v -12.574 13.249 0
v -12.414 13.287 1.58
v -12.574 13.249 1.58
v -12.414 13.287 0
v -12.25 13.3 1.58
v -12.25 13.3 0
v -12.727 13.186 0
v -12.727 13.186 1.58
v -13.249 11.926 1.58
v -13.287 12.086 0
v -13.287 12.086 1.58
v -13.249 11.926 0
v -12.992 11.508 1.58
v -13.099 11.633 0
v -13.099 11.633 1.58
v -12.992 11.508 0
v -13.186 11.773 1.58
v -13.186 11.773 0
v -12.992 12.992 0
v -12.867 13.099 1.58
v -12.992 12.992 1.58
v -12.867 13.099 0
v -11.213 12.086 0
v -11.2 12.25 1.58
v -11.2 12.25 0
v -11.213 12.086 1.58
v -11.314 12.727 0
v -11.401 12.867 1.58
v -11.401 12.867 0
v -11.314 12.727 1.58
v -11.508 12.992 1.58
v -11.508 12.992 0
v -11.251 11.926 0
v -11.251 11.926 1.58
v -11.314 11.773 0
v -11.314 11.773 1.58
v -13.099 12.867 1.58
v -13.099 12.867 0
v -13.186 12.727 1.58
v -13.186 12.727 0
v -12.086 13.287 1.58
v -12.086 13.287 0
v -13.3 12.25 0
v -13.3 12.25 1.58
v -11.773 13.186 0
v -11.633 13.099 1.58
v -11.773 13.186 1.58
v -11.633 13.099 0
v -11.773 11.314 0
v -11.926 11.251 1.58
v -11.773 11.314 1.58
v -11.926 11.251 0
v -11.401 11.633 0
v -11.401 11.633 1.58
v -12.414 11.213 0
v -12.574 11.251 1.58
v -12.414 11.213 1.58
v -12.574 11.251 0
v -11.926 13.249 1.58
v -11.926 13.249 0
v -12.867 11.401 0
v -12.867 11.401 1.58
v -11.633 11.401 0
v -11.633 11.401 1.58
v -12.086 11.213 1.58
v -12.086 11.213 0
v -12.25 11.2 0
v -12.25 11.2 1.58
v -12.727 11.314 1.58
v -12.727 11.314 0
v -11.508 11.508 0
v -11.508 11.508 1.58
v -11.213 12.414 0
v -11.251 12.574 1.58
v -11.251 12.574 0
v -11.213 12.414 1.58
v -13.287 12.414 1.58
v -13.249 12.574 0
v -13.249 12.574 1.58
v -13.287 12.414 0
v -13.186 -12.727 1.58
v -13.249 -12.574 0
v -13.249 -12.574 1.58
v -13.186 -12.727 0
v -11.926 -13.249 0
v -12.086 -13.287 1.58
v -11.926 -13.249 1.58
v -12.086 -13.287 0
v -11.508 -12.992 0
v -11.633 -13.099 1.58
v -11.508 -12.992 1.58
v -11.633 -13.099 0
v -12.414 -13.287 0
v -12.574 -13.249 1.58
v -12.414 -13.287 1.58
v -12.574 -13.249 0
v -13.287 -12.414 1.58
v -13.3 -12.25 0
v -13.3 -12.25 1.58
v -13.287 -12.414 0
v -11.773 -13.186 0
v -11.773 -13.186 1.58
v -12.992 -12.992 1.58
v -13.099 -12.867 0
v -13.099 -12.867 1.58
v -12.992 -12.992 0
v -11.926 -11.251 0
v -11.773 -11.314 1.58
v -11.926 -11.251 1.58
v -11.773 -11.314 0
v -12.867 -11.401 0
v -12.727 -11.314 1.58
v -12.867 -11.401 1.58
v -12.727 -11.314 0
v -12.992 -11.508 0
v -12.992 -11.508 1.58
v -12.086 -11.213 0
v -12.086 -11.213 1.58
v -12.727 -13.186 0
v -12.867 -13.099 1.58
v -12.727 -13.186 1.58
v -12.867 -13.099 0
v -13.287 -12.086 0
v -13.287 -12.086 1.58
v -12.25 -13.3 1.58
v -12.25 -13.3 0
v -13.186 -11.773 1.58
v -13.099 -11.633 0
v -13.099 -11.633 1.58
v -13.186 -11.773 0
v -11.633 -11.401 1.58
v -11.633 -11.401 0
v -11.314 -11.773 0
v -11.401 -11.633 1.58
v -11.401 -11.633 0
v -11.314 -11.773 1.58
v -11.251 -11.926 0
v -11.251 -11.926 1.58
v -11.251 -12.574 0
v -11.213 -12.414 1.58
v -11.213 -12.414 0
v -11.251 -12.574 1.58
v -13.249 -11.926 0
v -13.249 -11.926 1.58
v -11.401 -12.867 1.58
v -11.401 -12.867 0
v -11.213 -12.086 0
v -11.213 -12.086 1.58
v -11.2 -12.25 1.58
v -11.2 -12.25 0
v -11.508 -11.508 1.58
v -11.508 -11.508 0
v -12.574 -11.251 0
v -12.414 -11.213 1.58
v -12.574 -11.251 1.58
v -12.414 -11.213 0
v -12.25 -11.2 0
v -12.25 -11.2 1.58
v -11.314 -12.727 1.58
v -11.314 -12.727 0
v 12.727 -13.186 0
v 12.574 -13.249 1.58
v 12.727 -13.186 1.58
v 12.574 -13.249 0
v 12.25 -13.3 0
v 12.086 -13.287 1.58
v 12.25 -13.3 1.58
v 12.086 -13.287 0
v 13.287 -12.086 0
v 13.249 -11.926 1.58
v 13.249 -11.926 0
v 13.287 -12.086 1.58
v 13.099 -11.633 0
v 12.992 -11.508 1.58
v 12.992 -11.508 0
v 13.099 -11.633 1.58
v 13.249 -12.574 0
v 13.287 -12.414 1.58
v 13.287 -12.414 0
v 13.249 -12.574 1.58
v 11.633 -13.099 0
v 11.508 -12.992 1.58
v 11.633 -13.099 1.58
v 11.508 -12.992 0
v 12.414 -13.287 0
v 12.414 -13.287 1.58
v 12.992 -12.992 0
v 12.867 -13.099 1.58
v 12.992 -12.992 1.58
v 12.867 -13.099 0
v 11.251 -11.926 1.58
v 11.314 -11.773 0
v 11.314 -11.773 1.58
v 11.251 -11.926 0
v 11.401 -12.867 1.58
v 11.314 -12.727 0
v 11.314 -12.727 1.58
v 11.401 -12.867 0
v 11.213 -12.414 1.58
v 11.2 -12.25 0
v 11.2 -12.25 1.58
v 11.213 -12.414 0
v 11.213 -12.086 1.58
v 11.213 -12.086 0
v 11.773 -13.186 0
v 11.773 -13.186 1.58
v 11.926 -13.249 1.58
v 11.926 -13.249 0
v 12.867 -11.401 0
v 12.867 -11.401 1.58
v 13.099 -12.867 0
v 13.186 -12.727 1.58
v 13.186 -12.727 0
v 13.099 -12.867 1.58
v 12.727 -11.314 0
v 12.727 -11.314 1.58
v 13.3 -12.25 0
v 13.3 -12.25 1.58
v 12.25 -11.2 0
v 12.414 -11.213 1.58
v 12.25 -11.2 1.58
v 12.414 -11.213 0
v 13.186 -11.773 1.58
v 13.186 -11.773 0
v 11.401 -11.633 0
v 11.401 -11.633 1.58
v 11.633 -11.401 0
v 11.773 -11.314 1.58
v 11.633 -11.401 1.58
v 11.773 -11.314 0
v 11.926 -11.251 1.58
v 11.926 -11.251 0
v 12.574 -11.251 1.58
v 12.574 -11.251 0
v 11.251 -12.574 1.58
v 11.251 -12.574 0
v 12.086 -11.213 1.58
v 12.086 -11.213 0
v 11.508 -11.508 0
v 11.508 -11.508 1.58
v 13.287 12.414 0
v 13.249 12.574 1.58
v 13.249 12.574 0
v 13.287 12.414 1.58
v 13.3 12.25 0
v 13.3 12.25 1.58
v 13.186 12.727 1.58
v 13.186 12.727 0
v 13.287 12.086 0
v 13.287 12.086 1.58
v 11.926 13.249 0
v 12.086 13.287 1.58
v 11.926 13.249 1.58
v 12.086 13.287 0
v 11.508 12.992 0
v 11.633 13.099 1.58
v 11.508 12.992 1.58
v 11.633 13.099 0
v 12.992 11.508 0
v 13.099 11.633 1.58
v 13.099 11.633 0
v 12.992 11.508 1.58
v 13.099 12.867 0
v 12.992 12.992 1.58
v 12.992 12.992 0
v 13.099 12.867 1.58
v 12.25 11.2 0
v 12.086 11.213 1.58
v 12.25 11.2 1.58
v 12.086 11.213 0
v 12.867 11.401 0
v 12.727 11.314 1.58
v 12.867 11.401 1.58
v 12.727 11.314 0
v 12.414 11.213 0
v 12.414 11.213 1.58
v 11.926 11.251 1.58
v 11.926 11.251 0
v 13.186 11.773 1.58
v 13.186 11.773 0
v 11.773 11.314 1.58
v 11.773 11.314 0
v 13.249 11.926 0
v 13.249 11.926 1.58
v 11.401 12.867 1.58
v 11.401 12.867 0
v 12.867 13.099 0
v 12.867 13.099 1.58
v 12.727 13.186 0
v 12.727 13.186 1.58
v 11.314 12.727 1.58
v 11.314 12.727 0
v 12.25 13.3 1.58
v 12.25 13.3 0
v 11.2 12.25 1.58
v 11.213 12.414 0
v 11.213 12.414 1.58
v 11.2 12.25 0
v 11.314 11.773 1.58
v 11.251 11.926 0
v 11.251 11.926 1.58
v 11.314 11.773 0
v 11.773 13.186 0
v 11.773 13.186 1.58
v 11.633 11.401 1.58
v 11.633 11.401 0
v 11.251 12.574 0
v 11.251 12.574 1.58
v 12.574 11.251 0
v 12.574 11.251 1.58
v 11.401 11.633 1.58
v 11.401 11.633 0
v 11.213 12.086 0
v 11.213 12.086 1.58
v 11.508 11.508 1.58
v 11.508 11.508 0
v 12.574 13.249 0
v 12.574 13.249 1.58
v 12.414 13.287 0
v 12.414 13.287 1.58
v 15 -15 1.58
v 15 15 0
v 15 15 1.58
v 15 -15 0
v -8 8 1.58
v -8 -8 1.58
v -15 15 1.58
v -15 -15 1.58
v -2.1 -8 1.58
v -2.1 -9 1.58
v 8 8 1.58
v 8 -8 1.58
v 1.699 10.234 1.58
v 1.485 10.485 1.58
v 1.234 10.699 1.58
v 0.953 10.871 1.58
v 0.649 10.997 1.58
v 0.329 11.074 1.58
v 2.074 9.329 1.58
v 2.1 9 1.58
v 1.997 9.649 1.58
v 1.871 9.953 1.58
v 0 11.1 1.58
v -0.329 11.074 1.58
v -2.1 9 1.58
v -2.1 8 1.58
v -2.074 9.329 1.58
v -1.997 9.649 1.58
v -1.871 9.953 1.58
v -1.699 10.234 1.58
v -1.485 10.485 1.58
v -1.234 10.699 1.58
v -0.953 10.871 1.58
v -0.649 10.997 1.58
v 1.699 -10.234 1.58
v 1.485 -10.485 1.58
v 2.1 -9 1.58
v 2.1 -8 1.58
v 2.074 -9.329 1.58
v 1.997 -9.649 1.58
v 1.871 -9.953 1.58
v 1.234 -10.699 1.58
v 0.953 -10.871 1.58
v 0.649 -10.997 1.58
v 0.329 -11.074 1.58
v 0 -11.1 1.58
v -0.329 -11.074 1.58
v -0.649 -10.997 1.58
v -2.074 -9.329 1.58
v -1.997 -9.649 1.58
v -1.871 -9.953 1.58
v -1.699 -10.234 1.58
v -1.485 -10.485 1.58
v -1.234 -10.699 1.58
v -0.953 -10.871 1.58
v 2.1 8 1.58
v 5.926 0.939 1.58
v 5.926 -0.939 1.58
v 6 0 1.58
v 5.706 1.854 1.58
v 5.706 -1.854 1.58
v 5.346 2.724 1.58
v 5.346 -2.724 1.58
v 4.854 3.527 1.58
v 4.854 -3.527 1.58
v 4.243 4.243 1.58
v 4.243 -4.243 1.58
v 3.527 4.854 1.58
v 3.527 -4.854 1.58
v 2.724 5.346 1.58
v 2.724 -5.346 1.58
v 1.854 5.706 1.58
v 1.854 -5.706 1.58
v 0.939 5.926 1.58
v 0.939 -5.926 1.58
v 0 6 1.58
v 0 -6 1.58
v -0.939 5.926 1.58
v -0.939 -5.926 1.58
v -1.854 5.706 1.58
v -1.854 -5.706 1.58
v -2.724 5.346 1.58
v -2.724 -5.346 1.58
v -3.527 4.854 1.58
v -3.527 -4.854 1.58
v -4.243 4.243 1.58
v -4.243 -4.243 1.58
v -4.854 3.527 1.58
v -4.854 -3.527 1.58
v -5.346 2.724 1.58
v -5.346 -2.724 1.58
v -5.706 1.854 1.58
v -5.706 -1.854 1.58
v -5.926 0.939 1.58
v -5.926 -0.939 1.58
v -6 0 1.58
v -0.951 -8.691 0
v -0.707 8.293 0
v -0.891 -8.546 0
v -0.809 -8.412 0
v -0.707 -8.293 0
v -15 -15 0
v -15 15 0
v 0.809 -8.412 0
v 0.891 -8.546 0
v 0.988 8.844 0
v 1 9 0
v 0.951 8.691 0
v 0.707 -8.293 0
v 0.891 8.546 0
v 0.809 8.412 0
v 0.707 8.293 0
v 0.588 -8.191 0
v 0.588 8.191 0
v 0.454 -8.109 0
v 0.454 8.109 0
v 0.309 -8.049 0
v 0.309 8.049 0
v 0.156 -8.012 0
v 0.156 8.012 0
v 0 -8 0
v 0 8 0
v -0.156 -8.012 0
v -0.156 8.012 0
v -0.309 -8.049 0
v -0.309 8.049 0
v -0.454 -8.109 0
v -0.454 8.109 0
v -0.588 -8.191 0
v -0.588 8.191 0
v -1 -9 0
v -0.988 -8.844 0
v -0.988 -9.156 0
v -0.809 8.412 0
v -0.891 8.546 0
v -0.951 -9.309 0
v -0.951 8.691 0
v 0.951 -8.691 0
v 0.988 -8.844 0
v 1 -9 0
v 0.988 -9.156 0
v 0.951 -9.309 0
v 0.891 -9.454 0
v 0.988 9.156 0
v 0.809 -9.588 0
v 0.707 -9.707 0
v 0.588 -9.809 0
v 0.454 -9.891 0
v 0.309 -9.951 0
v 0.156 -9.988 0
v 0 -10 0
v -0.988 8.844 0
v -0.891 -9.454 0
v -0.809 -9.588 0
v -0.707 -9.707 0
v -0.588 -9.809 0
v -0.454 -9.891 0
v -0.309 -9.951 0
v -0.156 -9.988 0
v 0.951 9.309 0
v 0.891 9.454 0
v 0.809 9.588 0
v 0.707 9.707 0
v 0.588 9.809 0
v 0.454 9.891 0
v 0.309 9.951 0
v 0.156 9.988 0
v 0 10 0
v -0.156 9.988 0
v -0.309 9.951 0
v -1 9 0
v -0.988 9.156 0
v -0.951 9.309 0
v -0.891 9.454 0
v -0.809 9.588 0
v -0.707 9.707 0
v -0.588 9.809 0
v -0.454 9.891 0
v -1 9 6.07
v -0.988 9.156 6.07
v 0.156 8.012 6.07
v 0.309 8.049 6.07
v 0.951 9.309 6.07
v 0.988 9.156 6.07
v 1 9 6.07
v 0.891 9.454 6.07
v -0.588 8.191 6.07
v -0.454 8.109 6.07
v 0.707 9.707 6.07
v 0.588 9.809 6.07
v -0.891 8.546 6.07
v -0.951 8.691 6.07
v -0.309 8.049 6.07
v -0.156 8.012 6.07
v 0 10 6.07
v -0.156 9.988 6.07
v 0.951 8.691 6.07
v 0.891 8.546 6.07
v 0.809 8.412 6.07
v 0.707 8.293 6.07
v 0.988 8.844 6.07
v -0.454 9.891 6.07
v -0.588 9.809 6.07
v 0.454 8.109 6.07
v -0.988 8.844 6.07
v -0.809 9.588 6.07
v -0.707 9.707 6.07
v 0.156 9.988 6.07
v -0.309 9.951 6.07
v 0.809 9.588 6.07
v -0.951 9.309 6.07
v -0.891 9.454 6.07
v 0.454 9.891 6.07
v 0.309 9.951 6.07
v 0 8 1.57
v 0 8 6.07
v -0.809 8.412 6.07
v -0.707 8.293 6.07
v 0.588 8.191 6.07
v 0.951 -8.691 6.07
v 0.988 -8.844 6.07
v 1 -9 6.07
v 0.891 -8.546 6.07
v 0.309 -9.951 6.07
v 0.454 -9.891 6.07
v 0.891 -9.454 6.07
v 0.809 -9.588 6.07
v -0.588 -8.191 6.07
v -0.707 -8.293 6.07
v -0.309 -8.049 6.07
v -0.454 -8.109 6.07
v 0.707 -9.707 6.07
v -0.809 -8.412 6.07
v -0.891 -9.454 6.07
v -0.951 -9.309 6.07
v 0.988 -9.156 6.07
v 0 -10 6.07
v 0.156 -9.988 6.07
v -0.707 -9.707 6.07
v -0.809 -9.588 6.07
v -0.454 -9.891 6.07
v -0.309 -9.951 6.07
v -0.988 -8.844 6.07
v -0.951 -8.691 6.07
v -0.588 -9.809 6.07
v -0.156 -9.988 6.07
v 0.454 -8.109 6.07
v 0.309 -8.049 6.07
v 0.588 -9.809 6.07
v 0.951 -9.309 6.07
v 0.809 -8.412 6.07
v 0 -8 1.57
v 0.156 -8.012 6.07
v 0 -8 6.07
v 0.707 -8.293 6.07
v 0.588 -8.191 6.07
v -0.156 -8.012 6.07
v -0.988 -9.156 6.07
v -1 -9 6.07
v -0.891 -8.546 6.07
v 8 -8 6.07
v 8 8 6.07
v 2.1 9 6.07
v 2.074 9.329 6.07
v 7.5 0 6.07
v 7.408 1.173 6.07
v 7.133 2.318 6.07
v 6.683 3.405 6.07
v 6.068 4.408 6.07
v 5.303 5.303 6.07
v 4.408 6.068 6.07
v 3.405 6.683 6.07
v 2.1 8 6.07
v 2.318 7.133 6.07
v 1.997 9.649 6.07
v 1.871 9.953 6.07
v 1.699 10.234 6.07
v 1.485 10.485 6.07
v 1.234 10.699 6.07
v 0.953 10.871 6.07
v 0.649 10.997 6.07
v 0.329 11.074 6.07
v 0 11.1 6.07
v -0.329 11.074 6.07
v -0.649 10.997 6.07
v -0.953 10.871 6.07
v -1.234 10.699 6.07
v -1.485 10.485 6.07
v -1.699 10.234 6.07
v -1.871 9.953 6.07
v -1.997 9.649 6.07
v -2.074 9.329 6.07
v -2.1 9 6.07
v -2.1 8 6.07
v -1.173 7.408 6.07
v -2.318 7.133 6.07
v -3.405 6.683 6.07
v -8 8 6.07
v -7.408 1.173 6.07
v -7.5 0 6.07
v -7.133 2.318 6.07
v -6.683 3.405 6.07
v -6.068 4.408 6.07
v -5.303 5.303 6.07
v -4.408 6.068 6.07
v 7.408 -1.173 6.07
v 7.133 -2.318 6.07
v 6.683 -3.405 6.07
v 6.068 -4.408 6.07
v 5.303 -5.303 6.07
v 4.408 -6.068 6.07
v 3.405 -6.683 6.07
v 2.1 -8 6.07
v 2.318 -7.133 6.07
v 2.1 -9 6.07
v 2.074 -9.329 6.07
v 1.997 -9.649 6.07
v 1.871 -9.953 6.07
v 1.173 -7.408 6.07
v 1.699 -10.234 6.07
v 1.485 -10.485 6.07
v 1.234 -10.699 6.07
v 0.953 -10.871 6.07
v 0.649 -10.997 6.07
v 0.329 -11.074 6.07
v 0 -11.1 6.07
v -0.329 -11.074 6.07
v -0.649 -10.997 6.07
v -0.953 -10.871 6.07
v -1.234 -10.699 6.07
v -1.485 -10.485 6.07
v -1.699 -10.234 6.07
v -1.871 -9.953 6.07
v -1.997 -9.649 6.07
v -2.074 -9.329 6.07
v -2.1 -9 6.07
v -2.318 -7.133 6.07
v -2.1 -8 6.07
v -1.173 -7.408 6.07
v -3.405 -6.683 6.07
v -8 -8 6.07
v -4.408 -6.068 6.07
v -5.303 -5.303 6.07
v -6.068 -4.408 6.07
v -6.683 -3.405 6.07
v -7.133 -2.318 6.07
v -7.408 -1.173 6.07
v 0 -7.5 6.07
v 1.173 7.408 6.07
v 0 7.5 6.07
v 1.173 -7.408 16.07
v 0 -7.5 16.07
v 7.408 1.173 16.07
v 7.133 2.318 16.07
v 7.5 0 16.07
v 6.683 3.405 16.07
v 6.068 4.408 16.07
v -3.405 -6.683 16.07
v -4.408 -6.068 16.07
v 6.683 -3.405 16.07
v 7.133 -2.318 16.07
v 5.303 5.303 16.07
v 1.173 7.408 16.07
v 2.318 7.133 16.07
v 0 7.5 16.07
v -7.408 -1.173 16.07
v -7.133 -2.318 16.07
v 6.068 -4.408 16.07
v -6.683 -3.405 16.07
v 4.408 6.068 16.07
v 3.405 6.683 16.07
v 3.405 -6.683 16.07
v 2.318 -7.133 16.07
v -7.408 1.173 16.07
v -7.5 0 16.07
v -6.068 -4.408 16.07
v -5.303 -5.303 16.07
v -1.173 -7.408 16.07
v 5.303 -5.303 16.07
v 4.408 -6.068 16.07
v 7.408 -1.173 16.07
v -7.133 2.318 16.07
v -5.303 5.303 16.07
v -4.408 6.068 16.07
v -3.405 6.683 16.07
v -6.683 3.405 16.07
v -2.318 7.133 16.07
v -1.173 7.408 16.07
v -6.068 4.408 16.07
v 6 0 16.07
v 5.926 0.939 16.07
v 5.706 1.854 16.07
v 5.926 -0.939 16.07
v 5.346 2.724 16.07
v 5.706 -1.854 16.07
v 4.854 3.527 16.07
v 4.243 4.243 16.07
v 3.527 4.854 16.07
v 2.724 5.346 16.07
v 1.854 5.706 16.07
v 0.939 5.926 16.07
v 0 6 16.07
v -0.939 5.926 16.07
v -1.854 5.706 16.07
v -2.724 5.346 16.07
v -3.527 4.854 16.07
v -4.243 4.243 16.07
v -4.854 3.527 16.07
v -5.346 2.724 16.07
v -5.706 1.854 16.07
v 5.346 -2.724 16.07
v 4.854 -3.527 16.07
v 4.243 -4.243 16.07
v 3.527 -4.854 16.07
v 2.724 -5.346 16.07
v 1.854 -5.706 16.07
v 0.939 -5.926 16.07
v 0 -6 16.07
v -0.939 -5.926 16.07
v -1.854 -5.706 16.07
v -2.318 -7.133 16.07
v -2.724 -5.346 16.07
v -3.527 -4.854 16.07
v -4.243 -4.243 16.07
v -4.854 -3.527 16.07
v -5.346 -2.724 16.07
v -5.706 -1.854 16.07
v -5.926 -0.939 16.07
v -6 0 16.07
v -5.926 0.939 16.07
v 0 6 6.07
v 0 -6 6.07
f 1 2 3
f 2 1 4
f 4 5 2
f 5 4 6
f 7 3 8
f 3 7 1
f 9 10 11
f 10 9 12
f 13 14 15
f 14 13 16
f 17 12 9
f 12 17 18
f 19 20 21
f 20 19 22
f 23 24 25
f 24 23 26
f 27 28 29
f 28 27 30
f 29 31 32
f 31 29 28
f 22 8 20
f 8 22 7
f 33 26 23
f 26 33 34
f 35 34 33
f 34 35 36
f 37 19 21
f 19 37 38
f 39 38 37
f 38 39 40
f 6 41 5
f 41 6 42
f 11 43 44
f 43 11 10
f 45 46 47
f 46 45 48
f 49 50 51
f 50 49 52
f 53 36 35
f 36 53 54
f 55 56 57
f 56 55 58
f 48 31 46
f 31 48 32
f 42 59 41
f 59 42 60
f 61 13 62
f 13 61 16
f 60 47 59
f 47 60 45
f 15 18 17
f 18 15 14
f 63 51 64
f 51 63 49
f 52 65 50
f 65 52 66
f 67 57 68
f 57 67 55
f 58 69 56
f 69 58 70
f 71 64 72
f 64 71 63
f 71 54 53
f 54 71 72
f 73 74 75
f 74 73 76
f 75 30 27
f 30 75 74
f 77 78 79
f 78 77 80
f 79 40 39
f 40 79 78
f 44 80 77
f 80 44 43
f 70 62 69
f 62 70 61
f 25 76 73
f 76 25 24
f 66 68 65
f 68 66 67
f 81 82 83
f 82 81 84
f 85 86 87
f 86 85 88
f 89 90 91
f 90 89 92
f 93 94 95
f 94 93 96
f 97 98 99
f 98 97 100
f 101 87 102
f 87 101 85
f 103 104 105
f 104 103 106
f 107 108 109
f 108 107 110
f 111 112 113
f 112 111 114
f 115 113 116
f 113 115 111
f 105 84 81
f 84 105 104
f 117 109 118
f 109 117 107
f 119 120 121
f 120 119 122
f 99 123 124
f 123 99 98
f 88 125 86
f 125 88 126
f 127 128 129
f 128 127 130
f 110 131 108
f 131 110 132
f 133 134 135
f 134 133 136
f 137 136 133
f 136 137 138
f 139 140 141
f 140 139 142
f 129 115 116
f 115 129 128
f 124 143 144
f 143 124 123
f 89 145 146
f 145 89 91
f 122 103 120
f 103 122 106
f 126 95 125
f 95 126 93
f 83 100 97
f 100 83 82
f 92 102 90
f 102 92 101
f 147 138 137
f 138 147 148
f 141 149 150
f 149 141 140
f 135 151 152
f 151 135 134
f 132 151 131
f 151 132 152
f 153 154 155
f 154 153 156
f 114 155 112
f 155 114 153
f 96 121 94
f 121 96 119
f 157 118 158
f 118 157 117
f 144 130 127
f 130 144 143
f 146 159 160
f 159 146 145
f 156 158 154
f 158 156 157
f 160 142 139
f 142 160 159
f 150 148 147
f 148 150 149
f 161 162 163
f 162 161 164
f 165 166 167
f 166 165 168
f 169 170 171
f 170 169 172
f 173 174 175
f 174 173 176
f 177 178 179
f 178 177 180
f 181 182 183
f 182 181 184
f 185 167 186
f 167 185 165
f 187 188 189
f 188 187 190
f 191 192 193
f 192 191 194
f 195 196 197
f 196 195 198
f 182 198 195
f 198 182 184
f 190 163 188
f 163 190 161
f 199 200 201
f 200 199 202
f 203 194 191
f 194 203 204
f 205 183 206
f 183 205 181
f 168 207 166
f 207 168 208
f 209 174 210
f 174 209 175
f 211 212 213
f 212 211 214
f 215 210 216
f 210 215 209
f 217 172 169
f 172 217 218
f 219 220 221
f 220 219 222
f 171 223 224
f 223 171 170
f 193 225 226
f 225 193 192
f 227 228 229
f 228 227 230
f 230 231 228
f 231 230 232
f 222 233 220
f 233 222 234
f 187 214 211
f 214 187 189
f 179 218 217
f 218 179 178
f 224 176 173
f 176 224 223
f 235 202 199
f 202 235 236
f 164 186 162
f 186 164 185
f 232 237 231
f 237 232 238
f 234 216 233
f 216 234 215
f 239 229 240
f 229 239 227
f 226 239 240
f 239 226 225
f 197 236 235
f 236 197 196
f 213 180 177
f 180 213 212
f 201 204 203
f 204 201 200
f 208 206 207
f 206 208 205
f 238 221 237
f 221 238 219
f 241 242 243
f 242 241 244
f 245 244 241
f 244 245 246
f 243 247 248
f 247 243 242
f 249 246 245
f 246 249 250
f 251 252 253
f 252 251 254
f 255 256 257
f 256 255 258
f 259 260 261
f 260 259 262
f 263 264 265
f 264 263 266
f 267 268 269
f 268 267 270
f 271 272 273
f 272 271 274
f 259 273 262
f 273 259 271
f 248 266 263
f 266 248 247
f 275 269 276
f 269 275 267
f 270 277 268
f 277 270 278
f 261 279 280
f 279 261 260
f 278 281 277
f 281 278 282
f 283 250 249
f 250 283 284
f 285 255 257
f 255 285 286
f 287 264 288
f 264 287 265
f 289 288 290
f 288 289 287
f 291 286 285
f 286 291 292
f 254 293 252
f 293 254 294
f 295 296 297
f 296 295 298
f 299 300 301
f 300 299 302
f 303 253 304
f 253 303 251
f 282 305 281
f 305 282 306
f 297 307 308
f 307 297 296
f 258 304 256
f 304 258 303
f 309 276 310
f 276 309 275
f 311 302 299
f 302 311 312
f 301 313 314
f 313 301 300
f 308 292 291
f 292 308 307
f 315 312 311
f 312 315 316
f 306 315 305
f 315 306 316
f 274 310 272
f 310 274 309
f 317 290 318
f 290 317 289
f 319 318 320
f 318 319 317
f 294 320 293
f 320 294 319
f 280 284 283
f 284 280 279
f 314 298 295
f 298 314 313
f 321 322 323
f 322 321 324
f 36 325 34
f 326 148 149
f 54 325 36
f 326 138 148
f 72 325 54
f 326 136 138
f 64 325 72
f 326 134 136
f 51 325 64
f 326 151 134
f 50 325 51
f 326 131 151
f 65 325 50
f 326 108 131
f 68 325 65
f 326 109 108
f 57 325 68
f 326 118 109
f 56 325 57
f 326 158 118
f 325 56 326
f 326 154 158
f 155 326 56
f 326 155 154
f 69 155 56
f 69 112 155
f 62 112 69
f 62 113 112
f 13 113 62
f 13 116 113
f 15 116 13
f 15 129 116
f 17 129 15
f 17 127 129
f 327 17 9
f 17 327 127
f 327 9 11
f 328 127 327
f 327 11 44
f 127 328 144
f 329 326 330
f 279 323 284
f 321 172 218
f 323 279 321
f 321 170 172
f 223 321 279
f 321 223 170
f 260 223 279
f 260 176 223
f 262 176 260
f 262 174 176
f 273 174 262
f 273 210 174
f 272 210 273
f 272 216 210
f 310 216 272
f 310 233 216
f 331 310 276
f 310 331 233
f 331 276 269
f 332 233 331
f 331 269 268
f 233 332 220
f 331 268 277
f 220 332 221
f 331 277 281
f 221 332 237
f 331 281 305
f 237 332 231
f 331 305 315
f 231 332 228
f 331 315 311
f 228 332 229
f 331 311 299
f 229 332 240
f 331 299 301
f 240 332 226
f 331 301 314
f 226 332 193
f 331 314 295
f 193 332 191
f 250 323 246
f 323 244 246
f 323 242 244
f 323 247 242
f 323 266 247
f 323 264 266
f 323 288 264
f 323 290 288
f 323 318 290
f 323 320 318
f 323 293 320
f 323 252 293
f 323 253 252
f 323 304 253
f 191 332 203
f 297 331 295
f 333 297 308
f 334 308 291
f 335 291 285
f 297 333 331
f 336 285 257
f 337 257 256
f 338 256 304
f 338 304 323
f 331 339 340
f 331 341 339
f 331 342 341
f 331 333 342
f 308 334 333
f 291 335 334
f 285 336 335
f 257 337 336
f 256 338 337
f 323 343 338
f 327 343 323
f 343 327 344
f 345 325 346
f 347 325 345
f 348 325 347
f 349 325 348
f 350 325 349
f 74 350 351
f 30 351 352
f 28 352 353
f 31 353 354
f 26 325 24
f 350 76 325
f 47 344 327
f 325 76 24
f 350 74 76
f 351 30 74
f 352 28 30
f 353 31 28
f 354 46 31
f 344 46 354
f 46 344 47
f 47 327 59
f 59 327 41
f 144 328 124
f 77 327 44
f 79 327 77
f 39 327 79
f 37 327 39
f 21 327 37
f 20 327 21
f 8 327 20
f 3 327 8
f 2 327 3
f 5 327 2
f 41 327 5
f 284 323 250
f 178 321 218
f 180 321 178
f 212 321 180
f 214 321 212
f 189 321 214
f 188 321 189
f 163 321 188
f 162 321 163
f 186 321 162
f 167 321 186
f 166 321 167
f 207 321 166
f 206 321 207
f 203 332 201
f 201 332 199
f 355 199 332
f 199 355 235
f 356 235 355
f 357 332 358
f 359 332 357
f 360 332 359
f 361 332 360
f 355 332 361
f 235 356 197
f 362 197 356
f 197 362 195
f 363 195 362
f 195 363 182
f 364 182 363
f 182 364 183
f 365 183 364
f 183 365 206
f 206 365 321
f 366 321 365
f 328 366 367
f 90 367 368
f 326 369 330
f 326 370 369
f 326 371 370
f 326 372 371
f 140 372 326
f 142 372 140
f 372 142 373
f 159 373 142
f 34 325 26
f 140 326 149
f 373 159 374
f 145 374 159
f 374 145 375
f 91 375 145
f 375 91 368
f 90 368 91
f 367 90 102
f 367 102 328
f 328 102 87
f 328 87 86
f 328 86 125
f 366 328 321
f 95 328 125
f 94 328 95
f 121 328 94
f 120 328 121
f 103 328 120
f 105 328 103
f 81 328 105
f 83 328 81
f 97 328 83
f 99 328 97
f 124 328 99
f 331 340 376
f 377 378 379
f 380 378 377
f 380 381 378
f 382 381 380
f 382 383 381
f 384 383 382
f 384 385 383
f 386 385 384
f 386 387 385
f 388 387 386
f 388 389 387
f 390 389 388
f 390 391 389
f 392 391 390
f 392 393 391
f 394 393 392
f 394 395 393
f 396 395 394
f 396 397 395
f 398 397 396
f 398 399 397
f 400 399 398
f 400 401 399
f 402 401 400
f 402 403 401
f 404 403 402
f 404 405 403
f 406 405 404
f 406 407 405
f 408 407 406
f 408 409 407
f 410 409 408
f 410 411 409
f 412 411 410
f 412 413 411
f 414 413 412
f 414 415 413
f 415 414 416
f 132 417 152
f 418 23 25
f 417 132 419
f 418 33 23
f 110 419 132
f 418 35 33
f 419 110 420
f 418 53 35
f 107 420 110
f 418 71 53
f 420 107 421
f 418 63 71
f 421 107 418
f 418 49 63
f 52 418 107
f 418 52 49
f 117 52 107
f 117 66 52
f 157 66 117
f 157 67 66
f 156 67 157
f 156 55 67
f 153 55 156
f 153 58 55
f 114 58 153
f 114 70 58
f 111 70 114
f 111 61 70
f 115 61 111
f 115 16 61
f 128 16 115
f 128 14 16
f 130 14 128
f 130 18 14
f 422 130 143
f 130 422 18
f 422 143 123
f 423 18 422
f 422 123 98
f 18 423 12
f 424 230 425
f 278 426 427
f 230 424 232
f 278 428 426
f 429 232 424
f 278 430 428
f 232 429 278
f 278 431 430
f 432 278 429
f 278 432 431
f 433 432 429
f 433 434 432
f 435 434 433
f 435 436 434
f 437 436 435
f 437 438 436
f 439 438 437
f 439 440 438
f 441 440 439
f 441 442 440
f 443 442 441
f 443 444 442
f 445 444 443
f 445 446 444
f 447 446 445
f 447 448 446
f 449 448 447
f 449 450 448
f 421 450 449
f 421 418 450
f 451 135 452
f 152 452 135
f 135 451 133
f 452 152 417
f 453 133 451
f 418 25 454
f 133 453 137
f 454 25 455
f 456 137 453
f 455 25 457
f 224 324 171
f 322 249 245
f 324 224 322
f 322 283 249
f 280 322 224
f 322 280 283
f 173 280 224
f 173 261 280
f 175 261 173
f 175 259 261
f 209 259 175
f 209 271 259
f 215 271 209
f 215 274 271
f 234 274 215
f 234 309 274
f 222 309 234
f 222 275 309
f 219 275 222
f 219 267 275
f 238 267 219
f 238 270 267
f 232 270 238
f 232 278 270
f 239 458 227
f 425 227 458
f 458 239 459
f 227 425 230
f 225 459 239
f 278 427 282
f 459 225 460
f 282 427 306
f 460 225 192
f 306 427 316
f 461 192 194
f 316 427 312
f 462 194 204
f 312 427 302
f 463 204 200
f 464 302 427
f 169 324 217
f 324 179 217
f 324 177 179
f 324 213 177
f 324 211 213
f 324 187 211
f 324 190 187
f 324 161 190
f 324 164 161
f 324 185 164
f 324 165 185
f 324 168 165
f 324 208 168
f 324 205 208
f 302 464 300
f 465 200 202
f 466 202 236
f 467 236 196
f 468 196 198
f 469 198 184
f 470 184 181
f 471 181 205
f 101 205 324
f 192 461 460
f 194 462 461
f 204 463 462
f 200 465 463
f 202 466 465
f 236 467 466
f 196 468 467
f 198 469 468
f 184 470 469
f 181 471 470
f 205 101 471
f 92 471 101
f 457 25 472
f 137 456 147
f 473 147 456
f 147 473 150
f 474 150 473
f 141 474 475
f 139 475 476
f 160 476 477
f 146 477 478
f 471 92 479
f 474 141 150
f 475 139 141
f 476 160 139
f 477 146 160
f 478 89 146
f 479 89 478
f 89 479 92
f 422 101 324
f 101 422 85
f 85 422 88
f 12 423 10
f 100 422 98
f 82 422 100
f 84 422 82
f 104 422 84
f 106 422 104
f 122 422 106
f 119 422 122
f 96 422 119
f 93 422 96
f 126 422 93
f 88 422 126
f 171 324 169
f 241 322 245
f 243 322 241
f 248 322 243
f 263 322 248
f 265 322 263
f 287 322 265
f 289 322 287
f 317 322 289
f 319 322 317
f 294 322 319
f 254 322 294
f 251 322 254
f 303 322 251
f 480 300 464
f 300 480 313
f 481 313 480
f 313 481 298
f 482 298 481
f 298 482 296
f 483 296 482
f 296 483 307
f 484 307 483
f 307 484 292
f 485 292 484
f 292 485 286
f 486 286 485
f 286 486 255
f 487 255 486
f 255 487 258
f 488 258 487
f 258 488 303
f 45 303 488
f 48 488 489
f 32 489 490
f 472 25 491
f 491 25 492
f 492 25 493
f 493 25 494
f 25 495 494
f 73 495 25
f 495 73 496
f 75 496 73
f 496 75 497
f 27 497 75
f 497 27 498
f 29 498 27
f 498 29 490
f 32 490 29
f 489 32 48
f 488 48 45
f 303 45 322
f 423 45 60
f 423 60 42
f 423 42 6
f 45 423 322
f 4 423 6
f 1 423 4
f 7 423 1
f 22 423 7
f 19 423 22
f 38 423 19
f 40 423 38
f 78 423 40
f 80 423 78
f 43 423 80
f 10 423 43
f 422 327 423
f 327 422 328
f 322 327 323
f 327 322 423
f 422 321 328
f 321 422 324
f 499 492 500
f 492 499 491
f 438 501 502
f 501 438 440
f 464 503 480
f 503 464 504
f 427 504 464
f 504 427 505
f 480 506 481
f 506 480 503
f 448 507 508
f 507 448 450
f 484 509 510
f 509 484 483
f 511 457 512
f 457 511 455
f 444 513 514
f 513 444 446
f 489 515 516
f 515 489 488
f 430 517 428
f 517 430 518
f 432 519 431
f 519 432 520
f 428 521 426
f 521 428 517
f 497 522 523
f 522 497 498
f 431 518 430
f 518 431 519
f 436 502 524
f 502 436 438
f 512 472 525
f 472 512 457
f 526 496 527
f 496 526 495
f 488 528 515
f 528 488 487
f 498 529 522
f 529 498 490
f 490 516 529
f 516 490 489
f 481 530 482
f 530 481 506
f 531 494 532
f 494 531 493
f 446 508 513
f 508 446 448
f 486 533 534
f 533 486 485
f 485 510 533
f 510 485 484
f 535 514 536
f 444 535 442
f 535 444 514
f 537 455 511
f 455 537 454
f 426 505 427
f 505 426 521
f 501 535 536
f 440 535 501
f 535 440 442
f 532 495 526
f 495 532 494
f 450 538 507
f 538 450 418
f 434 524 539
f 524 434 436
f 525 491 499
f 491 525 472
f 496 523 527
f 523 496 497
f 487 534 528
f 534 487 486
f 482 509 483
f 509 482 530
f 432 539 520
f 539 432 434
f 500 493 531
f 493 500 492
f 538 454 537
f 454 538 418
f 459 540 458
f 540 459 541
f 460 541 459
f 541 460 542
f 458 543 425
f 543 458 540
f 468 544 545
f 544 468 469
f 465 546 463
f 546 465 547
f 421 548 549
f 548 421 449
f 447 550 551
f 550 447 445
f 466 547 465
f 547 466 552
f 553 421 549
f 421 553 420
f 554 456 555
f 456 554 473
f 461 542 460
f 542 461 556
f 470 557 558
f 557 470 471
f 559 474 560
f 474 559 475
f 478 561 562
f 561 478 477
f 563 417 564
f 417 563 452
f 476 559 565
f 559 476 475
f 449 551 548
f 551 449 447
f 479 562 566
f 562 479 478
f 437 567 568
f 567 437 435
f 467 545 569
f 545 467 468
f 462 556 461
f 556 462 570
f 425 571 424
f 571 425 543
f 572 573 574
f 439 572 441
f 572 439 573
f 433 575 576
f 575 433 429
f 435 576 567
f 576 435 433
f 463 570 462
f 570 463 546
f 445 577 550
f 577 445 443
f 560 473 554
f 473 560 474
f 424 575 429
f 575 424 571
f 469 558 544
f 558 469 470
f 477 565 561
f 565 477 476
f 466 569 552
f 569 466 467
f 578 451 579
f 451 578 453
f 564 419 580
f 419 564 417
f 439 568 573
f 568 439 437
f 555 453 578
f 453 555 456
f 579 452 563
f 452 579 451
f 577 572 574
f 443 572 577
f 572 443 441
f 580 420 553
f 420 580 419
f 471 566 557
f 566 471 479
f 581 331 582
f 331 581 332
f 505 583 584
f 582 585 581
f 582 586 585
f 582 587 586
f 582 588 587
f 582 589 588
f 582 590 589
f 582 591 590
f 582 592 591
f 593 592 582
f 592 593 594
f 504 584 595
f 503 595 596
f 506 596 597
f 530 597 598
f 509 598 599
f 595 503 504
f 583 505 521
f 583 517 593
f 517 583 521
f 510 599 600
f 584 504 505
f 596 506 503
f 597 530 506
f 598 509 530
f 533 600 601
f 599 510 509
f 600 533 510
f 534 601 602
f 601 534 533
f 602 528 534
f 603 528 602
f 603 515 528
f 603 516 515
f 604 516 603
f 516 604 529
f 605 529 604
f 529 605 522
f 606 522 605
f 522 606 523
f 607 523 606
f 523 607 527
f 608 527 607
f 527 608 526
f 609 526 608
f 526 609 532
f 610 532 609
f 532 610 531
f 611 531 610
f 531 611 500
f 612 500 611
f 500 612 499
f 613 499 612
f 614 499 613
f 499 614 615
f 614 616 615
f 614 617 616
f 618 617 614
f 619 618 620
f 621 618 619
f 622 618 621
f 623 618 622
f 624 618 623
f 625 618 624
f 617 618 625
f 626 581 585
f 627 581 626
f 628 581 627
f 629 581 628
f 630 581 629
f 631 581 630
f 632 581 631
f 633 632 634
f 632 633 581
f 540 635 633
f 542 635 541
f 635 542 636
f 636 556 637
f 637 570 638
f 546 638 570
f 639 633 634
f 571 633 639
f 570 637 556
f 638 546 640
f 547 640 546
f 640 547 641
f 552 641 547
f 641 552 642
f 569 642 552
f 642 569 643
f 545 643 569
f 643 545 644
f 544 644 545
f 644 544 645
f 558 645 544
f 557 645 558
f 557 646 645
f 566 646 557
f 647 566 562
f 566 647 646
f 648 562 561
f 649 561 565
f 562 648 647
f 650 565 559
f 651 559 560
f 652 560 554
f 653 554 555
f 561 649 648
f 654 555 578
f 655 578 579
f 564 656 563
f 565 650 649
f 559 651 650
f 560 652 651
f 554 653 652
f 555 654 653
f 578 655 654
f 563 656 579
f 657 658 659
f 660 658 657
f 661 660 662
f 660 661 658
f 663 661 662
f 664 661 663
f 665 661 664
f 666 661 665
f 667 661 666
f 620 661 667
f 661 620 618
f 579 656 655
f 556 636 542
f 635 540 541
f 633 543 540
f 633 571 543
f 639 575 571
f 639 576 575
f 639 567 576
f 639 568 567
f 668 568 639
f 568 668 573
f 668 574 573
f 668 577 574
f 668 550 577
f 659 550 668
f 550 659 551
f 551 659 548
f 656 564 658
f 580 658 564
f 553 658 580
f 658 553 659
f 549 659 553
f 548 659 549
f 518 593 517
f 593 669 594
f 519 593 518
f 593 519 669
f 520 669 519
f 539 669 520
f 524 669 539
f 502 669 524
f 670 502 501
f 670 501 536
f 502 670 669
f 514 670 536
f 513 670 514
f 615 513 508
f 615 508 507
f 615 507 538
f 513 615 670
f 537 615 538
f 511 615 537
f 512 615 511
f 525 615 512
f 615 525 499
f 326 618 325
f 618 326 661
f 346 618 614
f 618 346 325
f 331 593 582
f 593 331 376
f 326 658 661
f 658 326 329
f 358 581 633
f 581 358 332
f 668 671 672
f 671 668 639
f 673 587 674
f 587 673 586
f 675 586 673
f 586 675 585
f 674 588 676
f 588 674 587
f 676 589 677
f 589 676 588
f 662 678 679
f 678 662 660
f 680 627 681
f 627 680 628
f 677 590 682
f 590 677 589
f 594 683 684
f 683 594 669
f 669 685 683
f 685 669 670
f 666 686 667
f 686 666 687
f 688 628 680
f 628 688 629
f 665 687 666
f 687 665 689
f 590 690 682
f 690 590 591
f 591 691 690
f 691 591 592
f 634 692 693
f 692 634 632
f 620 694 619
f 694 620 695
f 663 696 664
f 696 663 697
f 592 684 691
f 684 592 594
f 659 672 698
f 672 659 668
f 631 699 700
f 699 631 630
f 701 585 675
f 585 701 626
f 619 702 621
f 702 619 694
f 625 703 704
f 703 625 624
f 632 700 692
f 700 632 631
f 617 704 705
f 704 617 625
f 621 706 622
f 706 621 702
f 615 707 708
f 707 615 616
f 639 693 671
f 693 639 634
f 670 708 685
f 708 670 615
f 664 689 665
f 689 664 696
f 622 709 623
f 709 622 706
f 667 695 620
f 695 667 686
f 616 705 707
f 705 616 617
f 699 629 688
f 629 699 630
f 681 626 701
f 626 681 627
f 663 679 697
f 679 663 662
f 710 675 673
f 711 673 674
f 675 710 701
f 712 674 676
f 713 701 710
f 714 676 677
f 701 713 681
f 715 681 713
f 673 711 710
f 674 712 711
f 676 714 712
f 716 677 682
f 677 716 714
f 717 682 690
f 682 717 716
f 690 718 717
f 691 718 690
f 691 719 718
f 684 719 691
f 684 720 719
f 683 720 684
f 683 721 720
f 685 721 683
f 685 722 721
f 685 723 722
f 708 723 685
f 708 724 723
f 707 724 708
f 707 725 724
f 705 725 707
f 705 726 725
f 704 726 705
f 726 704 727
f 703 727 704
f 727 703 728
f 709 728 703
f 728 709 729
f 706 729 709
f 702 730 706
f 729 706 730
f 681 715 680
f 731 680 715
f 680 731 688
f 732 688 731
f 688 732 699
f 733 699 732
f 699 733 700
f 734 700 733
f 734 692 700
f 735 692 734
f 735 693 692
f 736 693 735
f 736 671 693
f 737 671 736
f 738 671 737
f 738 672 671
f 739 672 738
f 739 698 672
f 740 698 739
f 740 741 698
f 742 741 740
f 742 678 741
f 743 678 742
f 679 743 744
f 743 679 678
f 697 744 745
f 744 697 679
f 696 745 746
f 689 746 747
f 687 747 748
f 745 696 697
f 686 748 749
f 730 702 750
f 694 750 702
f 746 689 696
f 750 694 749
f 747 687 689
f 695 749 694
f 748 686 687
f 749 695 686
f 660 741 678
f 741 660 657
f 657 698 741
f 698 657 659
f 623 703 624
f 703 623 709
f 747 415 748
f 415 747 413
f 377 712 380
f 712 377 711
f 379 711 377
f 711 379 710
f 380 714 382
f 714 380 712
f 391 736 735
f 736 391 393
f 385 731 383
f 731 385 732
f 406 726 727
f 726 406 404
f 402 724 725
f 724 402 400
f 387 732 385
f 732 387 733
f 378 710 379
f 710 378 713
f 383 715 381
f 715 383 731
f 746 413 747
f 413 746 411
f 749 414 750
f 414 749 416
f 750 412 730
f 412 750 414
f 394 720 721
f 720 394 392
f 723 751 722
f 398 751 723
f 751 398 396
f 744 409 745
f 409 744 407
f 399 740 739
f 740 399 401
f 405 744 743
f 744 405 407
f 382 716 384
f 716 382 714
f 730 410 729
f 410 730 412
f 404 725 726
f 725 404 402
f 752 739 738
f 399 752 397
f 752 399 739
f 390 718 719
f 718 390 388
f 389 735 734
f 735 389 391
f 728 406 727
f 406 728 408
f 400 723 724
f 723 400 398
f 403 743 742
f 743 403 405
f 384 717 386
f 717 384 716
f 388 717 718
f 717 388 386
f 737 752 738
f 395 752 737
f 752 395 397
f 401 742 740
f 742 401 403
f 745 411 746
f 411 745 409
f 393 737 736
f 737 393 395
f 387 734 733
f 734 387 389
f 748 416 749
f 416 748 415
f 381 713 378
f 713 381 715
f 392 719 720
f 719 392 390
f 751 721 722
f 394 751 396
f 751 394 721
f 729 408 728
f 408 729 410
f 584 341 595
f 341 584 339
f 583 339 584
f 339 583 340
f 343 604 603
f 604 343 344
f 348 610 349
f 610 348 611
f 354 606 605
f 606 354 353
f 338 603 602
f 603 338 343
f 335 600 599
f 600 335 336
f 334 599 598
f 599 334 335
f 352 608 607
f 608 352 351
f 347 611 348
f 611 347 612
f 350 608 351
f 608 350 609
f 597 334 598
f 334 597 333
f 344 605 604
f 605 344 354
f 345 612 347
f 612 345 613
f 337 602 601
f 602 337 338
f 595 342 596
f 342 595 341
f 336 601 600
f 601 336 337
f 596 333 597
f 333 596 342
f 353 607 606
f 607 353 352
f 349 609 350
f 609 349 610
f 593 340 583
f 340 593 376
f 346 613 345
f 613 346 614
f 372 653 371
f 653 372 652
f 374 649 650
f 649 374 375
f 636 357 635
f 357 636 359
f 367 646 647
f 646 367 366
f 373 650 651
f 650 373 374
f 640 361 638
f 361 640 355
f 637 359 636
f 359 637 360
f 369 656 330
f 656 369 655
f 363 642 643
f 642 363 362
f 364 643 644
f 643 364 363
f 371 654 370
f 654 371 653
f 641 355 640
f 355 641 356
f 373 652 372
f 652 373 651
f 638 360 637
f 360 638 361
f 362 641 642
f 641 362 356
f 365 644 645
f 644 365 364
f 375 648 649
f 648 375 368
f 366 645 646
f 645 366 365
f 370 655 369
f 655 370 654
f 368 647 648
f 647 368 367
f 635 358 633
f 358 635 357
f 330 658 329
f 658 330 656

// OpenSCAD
$fn = 40;

module m12_lens_mount() {
  w = 16;
  base_h = 4.5;
  mount_color = [0.3, 0.3, 0.3];
  flange_w = 18.0;

  difference() {
    union() {
      // Base
      translate([0.0, 0.0, base_h / 2.0])
        color(mount_color)
          cube([w, w, base_h], center=true);

      // Lens thread body
      translate([0.0, 0.0, base_h + 10.0 / 2.0])
        color(mount_color)
          cylinder(h=10, r=7.5, center=true);
    }

    // Lens thread hole
    translate([0.0, 0.0, base_h / 2.0 + 10.0 / 2.0])
      color(mount_color)
        cylinder(h=14.5 + 0.01, r=6, center=true);
  }

  difference() {
    // Lens mount body
    union() {
      translate([0.0, flange_w / 2.0, base_h / 2.0])
        color(mount_color)
          cylinder(h=base_h, r=4.2 / 2.0, center=true);

      translate([0.0, flange_w / 2.0 - 3.0 / 2.0, base_h / 2.0])
        color(mount_color)
          cube([4.2, 3.0, base_h], center=true);
    }

    // Lens mount hole
    translate([0.0, flange_w / 2.0, base_h / 2.0])
      color(mount_color)
        cylinder(h=base_h + 0.01, r=2.0 / 2.0, center=true);
  }

  difference() {
    // Lens mount body
    union() {
      translate([0.0, -flange_w / 2.0, base_h / 2.0])
        color(mount_color)
          cylinder(h=base_h, r=4.2 / 2.0, center=true);

      translate([0.0, -flange_w / 2.0 + 3.0 / 2.0, base_h / 2.0])
        color(mount_color)
          cube([4.2, 3.0, base_h], center=true);
    }

    // Lens mount hole
    translate([0.0, -flange_w / 2.0, base_h / 2.0])
      color(mount_color)
        cylinder(h=base_h + 0.01, r=2.0 / 2.0, center=true);
  }
}

module board_camera() {
  pcb_width = 30.0;
  pcb_thickness = 1.58;
  pcb_hole = 2.1;
  lens_hole = 2.0;

  difference() {
    // PCB body
    translate([0.0, 0.0, pcb_thickness / 2.0])
      color([0.0, 1.0, 0.0])
        cube([pcb_width, pcb_width, pcb_thickness], center=true);

    // Lens holes
    translate([0.0, 9.0, pcb_thickness / 2.0])
      cylinder(h=pcb_thickness + 0.01, r=lens_hole / 2.0, center=true);
    translate([0.0, -9.0, pcb_thickness / 2.0])
      cylinder(h=pcb_thickness + 0.01, r=lens_hole / 2.0, center=true);


    // Mount holes
    for (i = [1 : 4]) {
      rotate([0.0, 0.0, i * 90.0])
        translate([24.5 / 2.0, 24.5 / 2.0, pcb_thickness / 2.0])
          cylinder(h=pcb_thickness + 0.01, r=pcb_hole / 2.0, center=true);
    }
  }

  // Lens mount
  translate([0.0, 0.0, pcb_thickness-0.01])
    m12_lens_mount();
}

board_camera();
